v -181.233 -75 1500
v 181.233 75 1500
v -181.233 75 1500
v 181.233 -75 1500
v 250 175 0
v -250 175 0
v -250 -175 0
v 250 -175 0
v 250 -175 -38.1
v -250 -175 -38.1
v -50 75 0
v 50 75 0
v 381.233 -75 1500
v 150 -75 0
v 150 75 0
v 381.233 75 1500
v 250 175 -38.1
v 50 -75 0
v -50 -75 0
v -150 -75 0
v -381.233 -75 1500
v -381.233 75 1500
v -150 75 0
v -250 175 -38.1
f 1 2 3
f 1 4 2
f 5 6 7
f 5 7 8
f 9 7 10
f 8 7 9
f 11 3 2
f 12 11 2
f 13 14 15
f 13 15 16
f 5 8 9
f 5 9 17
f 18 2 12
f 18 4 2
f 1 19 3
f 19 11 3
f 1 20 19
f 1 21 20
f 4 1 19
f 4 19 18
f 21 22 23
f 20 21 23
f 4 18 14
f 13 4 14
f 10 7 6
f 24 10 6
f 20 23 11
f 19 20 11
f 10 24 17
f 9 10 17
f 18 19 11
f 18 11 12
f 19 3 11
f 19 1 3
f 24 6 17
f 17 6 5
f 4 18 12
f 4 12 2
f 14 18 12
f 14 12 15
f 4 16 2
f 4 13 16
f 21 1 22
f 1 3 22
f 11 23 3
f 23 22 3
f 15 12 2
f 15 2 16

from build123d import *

# Parameters (mm, degrees)
F1_DEPTH = 75
F2_DEPTH = 75
F3_W     = 500
F3_H     = 350
F4_DEPTH = 38.1


with BuildPart() as f1:
    # F0 (on Front) → F1 (new body, symmetric)
    with BuildSketch(Plane.XZ):
        Polygon((-150, 0), (-50, 0), (-181.232995, 1500), (-381.232995, 1500), align=None)
        Polygon((181.232995, 1500), (50, 0), (150, 0), (381.232995, 1500), align=None)
    extrude(amount=F1_DEPTH, both=True)


with BuildPart() as f2:
    # F0 (on Front) → F2 (new body, symmetric)
    with BuildSketch(Plane.XZ):
        Polygon((-181.232995, 1500), (-50, 0), (50, 0), (181.232995, 1500), align=None)
    extrude(amount=F2_DEPTH, both=True)


with BuildPart() as f4:
    # F3 (on Top) → F4 (new body)
    with BuildSketch(Plane.XY):
        Rectangle(F3_W, F3_H)
    extrude(amount=-F4_DEPTH)


solid = Compound([f1.part, f2.part, f4.part])
